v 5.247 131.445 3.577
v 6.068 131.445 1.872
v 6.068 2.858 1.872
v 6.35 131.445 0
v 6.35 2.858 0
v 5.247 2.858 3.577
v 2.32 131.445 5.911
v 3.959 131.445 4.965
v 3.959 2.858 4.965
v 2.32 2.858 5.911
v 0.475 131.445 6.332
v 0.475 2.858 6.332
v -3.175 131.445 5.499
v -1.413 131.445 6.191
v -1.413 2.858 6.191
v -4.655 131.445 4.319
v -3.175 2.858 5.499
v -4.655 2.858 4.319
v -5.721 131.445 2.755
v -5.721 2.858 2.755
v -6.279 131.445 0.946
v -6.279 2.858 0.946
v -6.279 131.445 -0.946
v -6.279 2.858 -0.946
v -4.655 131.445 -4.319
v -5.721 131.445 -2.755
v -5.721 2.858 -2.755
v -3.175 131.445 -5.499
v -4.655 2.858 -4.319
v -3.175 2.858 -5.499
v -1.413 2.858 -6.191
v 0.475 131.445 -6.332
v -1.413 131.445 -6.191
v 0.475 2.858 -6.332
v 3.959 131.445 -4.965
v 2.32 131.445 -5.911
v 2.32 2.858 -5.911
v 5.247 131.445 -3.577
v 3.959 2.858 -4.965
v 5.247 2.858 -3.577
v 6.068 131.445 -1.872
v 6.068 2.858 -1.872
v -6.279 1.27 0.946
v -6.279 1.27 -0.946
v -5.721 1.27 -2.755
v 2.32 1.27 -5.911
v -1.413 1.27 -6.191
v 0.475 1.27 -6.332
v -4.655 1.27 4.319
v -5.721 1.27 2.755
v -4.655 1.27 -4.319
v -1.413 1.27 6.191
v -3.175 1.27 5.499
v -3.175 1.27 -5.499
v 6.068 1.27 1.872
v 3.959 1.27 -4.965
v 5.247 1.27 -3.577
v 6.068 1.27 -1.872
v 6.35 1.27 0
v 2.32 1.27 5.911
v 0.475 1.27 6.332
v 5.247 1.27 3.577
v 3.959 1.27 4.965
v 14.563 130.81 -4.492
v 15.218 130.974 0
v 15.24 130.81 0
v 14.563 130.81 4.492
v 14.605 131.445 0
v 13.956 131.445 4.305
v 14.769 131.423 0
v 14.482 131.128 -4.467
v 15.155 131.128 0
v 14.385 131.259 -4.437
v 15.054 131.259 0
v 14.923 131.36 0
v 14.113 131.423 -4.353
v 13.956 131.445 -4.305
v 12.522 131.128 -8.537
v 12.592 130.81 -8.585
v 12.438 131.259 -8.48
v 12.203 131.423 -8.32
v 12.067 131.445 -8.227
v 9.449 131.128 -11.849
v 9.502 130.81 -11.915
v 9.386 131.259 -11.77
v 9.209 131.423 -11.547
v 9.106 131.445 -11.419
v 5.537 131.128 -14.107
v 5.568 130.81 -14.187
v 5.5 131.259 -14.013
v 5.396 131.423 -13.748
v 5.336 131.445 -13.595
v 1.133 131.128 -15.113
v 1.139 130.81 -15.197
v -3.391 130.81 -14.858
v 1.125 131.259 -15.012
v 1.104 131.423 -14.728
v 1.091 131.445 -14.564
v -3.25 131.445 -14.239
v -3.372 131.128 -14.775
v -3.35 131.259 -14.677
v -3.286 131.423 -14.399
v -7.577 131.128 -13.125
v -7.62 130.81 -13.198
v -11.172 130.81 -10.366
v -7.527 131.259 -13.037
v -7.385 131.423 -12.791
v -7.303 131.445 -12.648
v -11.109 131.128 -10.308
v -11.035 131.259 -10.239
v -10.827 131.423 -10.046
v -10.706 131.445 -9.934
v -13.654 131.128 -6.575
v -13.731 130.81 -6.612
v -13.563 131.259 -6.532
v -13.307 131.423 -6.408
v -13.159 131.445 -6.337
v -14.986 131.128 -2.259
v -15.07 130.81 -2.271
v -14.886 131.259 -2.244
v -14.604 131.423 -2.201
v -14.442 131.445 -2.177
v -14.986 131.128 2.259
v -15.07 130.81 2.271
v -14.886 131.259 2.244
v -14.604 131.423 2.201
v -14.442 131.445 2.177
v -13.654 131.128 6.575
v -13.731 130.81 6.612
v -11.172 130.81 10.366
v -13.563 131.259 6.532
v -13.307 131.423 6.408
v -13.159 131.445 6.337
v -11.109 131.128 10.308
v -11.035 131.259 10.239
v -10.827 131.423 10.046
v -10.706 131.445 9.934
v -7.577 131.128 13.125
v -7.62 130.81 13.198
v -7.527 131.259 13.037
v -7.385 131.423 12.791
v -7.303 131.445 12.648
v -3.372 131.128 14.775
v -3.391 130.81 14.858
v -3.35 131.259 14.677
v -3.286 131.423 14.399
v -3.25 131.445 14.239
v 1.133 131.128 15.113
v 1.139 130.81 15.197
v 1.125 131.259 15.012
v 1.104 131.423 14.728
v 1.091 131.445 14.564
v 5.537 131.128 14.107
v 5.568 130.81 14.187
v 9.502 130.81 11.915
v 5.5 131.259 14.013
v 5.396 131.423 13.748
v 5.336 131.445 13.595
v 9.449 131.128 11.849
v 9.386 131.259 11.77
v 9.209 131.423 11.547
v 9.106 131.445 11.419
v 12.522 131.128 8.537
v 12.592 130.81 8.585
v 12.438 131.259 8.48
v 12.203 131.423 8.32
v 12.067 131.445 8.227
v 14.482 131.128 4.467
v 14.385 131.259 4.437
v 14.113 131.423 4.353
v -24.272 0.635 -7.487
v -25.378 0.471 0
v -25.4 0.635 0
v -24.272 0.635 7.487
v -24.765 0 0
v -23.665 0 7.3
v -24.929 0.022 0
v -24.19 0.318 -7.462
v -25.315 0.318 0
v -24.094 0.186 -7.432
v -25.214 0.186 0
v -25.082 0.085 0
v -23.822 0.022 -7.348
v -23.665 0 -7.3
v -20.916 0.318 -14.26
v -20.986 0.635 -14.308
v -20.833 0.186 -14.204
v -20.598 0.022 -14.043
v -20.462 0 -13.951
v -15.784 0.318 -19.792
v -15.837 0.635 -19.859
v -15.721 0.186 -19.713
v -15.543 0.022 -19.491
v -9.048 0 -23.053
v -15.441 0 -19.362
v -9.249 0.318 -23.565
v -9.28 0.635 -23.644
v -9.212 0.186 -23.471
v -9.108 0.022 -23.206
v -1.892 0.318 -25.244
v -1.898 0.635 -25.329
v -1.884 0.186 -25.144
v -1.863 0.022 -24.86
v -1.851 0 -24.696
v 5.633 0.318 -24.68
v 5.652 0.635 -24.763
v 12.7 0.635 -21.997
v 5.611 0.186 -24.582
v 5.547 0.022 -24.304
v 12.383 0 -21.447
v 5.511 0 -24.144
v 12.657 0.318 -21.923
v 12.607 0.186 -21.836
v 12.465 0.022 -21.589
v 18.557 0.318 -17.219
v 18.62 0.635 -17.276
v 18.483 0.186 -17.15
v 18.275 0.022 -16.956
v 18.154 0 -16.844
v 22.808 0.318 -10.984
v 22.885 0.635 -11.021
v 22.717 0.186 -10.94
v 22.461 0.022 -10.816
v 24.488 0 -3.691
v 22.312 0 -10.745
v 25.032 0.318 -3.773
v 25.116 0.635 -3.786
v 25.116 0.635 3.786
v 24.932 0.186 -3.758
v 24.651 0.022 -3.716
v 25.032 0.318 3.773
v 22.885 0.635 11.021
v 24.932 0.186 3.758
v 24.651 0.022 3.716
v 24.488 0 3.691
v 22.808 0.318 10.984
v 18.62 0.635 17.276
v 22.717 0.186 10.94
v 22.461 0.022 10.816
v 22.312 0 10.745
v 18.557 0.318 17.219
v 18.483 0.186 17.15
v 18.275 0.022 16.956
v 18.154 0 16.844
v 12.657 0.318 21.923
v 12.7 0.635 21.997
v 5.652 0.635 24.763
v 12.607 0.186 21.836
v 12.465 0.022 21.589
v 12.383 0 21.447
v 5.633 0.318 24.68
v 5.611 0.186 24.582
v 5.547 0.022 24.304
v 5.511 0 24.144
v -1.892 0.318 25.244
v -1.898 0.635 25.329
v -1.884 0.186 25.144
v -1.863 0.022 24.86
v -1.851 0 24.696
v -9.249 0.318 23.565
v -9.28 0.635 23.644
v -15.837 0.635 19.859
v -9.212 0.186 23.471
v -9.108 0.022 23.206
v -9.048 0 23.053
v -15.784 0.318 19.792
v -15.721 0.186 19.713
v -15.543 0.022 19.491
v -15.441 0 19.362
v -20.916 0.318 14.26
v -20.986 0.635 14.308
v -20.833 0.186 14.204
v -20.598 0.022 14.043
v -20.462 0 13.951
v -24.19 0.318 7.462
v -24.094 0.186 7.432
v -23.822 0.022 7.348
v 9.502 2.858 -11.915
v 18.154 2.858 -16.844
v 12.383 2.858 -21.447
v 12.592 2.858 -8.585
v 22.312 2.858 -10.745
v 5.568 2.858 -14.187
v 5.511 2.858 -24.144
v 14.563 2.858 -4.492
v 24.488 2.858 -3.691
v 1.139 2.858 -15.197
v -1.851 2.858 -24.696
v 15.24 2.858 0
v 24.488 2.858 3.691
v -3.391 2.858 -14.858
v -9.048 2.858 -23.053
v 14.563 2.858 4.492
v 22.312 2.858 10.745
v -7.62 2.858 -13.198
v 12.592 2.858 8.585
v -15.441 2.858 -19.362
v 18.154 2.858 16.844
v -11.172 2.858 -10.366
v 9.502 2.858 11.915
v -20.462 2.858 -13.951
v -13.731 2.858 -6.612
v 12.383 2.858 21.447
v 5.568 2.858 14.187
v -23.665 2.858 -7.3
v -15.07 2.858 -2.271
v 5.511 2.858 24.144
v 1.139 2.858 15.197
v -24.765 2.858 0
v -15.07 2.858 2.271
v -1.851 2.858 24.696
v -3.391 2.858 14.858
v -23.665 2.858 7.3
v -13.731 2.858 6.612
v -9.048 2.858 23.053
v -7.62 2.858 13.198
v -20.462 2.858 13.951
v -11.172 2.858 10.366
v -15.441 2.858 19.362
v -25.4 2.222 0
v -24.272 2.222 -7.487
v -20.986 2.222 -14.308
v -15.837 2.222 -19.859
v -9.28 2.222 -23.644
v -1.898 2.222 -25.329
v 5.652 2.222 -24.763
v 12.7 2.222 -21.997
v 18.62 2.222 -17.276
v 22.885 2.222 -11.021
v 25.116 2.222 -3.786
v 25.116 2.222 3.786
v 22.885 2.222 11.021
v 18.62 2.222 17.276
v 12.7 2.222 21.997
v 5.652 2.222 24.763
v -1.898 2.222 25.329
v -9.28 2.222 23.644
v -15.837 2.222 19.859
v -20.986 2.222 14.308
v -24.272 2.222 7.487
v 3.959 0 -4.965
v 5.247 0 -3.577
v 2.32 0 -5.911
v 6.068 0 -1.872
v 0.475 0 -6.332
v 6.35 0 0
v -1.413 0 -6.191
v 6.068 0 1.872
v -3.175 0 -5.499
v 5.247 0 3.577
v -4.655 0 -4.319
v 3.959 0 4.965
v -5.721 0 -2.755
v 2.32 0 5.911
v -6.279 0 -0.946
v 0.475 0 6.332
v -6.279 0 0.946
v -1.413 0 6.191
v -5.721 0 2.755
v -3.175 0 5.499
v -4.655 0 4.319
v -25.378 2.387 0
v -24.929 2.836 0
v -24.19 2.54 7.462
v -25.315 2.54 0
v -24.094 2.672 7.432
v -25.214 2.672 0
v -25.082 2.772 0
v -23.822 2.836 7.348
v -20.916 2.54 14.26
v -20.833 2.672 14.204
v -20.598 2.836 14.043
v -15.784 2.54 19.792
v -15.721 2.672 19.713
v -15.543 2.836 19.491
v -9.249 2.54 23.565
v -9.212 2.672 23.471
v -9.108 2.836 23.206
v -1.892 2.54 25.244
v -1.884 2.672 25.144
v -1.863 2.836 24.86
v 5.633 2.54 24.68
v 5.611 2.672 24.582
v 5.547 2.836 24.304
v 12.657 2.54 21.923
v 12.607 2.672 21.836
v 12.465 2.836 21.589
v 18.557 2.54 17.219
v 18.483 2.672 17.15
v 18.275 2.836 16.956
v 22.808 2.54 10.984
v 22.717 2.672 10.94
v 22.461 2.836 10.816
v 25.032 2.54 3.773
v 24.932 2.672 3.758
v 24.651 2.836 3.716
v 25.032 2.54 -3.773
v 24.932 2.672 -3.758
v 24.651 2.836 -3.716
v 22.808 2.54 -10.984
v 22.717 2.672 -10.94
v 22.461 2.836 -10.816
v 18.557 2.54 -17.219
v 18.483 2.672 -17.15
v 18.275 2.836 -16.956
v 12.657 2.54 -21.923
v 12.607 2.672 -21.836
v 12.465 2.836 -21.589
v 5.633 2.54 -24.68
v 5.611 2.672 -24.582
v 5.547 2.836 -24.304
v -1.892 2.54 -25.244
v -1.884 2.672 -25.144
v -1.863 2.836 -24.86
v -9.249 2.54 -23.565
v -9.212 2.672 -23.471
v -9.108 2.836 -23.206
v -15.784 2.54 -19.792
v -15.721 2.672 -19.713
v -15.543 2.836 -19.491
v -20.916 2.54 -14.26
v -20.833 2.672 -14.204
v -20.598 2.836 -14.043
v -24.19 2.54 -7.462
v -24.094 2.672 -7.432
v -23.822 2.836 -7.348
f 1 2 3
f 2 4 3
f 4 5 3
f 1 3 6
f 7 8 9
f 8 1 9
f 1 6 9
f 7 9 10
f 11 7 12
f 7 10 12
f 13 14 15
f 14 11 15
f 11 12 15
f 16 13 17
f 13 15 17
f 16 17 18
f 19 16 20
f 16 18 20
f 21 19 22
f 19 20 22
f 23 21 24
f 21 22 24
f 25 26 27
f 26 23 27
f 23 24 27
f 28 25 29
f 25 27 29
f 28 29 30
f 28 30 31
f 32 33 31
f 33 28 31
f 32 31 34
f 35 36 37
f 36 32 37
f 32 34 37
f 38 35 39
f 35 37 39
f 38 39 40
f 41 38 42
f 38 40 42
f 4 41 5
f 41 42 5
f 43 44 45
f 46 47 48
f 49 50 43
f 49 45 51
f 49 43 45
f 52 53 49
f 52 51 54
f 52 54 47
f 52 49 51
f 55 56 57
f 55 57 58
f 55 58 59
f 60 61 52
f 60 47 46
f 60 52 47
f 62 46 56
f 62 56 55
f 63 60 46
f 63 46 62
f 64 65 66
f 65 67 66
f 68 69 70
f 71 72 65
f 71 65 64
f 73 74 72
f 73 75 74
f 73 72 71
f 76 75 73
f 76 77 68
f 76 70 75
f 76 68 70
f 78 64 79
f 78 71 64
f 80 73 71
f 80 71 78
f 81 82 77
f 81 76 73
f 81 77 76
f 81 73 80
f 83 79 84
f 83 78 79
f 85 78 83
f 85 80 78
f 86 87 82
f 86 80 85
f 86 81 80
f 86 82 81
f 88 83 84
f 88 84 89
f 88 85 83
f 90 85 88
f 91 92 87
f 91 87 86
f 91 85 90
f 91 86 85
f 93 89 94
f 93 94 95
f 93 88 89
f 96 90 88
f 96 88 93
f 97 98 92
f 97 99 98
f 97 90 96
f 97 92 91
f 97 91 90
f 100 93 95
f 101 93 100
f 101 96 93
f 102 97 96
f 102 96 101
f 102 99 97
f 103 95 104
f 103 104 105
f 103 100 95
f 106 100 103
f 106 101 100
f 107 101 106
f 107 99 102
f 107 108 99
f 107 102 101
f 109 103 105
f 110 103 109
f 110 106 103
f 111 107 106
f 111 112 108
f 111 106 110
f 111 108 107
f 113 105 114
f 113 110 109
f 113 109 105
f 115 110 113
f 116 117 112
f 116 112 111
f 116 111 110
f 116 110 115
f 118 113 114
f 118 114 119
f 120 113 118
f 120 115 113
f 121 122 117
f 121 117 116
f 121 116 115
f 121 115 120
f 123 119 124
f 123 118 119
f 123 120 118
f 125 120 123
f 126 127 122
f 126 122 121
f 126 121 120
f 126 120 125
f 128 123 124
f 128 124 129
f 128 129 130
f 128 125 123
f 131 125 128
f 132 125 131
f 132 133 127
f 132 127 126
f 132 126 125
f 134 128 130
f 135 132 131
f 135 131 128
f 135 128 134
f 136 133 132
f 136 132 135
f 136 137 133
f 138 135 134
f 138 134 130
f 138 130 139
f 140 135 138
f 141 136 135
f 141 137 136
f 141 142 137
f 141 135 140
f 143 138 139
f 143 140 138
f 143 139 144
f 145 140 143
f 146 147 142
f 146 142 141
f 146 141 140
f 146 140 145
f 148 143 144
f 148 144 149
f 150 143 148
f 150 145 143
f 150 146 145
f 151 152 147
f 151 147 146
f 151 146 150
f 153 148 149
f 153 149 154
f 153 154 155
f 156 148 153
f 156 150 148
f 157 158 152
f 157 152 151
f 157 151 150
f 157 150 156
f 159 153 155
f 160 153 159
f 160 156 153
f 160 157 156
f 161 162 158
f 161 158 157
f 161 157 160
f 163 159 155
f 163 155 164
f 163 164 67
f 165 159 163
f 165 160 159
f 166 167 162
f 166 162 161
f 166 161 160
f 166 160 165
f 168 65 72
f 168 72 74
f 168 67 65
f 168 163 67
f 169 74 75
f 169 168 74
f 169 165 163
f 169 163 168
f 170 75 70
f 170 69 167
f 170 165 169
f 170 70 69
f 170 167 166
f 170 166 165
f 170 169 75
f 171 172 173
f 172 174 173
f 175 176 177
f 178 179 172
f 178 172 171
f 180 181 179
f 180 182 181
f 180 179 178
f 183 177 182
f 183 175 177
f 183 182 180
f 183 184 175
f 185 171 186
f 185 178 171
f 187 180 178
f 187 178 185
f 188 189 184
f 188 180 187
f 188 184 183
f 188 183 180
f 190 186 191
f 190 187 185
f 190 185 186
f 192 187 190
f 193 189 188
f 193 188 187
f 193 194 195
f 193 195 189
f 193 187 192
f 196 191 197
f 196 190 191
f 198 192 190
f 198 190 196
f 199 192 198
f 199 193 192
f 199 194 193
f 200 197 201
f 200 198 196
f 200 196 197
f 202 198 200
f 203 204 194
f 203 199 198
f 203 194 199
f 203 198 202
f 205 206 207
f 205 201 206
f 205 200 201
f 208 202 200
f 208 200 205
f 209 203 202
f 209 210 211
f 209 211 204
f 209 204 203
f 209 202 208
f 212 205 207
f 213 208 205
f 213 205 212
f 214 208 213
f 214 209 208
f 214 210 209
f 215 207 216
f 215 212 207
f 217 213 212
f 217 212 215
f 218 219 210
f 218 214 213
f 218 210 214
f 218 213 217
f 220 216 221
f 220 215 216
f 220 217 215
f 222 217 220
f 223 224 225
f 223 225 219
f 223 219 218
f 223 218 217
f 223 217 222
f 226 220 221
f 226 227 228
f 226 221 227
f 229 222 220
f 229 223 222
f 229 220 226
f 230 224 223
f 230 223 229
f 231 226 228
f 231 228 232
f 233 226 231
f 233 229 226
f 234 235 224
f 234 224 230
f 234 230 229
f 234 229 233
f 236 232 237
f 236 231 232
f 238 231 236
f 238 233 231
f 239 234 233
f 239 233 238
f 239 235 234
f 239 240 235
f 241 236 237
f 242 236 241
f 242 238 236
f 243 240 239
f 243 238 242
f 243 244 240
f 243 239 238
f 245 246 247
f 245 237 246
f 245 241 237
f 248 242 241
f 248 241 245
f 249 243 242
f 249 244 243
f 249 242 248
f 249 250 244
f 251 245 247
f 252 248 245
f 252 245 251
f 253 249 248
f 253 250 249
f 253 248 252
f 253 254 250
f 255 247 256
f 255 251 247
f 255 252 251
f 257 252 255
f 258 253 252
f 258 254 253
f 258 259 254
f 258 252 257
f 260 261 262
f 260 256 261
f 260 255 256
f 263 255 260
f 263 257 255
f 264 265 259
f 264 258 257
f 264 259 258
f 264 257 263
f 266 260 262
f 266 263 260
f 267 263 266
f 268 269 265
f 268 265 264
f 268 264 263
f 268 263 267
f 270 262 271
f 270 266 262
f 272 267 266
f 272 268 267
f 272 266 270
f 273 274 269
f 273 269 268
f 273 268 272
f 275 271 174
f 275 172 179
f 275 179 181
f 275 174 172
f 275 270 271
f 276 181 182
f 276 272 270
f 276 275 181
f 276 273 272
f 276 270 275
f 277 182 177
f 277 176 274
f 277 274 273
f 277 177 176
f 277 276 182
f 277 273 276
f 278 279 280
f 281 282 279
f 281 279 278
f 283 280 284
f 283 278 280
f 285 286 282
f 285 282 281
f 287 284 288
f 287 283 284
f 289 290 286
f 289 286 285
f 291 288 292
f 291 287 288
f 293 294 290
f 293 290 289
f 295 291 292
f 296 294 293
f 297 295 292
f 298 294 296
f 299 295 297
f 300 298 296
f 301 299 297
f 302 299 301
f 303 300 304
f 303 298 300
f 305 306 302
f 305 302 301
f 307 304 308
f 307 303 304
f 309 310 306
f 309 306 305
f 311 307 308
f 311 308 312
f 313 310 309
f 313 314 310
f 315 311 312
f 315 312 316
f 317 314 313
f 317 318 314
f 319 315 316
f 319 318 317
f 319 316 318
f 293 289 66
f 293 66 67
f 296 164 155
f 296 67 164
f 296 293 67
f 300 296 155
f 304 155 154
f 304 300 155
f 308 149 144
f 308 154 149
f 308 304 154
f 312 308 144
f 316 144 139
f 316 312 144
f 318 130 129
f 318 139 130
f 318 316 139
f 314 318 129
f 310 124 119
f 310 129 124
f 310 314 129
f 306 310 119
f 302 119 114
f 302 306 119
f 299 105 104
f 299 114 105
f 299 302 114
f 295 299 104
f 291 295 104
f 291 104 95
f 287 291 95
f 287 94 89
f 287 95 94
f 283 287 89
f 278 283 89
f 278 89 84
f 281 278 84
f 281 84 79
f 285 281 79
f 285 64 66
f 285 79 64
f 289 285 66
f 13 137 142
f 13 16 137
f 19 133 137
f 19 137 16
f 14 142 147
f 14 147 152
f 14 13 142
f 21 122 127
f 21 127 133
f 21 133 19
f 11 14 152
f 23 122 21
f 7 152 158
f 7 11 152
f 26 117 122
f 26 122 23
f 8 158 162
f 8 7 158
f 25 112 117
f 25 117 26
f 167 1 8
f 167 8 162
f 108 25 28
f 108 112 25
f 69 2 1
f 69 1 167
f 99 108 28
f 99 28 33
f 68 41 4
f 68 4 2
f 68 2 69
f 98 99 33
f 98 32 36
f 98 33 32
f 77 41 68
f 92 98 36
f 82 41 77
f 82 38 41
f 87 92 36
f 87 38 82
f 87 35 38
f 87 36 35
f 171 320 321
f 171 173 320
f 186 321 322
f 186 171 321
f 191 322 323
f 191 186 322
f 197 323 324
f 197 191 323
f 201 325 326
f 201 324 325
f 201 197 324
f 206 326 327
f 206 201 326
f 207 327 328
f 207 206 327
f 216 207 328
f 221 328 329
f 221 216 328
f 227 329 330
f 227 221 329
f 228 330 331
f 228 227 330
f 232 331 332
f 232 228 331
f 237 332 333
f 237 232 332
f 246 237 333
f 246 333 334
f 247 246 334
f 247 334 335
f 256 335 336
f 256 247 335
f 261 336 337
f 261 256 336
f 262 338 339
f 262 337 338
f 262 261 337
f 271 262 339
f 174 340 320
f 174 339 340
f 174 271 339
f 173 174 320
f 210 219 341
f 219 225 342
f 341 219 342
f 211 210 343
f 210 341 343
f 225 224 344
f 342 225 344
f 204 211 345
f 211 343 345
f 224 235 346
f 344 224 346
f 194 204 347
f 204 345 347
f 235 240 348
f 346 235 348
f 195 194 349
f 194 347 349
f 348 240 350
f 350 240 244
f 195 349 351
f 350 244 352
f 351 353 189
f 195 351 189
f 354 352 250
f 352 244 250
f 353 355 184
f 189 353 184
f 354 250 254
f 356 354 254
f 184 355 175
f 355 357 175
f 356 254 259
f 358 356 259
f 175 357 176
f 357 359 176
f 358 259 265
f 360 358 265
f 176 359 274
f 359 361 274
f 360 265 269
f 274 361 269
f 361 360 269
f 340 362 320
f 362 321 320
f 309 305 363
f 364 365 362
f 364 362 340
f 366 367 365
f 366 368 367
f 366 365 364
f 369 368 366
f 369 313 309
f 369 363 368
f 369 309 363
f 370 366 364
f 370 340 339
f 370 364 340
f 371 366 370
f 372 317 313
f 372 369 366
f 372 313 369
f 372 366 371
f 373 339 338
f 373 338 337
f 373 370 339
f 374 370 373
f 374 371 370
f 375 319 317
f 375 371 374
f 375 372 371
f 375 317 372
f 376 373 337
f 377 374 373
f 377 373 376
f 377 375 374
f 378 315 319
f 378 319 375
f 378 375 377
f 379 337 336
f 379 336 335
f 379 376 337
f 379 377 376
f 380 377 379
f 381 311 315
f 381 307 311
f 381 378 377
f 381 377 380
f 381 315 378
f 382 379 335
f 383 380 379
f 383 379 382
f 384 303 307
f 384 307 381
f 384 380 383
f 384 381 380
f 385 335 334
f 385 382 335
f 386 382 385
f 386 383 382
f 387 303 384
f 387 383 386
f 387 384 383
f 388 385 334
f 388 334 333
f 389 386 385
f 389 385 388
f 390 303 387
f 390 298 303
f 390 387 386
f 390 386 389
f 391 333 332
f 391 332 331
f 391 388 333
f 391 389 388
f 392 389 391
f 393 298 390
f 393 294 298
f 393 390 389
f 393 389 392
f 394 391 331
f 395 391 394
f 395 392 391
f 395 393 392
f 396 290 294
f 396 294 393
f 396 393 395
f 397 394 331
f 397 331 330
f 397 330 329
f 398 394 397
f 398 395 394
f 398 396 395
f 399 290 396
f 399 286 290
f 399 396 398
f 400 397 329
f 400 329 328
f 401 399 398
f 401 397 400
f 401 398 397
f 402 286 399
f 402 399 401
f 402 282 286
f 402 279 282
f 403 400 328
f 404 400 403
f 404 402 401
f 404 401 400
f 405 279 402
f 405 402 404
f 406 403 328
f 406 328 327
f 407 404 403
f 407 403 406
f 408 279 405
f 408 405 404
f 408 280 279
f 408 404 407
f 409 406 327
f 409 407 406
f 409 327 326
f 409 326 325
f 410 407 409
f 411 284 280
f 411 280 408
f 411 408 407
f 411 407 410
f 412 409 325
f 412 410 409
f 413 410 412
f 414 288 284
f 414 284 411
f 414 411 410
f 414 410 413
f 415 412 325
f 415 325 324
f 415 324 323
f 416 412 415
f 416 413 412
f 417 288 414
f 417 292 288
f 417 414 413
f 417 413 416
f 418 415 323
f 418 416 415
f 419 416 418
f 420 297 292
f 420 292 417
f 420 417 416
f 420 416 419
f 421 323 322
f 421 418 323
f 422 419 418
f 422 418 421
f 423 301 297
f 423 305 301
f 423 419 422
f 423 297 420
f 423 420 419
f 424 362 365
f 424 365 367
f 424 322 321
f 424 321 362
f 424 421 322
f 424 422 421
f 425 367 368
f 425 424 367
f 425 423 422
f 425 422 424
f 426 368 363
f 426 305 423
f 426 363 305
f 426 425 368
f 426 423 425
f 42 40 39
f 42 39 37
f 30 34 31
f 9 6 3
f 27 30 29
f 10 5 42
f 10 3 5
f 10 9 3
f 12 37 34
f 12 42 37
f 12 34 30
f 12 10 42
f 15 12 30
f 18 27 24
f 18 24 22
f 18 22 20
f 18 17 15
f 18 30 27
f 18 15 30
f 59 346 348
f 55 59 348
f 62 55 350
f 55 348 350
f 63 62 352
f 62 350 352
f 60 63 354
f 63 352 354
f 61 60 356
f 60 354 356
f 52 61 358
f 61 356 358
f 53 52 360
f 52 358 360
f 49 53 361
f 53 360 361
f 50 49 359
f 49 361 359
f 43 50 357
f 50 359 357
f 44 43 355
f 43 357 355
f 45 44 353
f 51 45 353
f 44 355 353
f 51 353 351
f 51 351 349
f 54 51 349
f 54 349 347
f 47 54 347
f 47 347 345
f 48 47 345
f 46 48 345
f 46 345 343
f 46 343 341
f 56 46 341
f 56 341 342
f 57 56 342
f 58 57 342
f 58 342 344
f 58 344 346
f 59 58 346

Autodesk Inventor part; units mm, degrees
ref_plane "YZ Plane" through (0, 0, 0) normal (1, 0, 0) x (0, 1, 0)
ref_plane "XZ Plane" through (0, 0, 0) normal (0, 1, 0) x (-1, 0, 0)
ref_plane "XY Plane" through (0, 0, 0) normal (0, 0, 1) x (1, 0, 0)
sketch "Sketch1" plane through (0, 0, 0) normal (0, 1, 0) x (-1, 0, 0)
  circle A0 centre (0, 0) radius 25.4
  dimension "d0" = 50.8
extrude "Extrusion1" add sketch "Sketch1" along normal blind 2.8575
fillet "Fillet1" radius 0.635 1 edges at (25.4, 2.8575, 0)
fillet "Fillet2" radius 0.635 1 edges at (25.4, 0, 0)
sketch "Sketch2" plane through (0, 2.8575, 0) normal (0, 1, 0) x (1, 0, 0)
  circle A0 centre (0, 0) radius 24.765 projected
  circle A1 centre (0, 0) radius 6.35
  circle A2 centre (0, 0) radius 15.24
  dimension "d5" = 12.7
  dimension "d6" = 30.48
extrude "Extrusion2" add sketch "Sketch2" along normal blind 128.5875 contours A2
fillet "Fillet3" radius 0.635 1 edges at (-15.24, 131.445, 0)
sketch "Sketch5" plane through (0, 0, 0) normal (0, -1, 0) x (1, 0, 0)
  circle A0 centre (0, 0) radius 24.765 projected
  circle A1 centre (0, 0) radius 6.35
  dimension "d34" = 12.7
extrude "Extrusion4" cut sketch "Sketch5" against normal blind 1.27 contours A1
properties part number "GripFinal" material "Rubber"
